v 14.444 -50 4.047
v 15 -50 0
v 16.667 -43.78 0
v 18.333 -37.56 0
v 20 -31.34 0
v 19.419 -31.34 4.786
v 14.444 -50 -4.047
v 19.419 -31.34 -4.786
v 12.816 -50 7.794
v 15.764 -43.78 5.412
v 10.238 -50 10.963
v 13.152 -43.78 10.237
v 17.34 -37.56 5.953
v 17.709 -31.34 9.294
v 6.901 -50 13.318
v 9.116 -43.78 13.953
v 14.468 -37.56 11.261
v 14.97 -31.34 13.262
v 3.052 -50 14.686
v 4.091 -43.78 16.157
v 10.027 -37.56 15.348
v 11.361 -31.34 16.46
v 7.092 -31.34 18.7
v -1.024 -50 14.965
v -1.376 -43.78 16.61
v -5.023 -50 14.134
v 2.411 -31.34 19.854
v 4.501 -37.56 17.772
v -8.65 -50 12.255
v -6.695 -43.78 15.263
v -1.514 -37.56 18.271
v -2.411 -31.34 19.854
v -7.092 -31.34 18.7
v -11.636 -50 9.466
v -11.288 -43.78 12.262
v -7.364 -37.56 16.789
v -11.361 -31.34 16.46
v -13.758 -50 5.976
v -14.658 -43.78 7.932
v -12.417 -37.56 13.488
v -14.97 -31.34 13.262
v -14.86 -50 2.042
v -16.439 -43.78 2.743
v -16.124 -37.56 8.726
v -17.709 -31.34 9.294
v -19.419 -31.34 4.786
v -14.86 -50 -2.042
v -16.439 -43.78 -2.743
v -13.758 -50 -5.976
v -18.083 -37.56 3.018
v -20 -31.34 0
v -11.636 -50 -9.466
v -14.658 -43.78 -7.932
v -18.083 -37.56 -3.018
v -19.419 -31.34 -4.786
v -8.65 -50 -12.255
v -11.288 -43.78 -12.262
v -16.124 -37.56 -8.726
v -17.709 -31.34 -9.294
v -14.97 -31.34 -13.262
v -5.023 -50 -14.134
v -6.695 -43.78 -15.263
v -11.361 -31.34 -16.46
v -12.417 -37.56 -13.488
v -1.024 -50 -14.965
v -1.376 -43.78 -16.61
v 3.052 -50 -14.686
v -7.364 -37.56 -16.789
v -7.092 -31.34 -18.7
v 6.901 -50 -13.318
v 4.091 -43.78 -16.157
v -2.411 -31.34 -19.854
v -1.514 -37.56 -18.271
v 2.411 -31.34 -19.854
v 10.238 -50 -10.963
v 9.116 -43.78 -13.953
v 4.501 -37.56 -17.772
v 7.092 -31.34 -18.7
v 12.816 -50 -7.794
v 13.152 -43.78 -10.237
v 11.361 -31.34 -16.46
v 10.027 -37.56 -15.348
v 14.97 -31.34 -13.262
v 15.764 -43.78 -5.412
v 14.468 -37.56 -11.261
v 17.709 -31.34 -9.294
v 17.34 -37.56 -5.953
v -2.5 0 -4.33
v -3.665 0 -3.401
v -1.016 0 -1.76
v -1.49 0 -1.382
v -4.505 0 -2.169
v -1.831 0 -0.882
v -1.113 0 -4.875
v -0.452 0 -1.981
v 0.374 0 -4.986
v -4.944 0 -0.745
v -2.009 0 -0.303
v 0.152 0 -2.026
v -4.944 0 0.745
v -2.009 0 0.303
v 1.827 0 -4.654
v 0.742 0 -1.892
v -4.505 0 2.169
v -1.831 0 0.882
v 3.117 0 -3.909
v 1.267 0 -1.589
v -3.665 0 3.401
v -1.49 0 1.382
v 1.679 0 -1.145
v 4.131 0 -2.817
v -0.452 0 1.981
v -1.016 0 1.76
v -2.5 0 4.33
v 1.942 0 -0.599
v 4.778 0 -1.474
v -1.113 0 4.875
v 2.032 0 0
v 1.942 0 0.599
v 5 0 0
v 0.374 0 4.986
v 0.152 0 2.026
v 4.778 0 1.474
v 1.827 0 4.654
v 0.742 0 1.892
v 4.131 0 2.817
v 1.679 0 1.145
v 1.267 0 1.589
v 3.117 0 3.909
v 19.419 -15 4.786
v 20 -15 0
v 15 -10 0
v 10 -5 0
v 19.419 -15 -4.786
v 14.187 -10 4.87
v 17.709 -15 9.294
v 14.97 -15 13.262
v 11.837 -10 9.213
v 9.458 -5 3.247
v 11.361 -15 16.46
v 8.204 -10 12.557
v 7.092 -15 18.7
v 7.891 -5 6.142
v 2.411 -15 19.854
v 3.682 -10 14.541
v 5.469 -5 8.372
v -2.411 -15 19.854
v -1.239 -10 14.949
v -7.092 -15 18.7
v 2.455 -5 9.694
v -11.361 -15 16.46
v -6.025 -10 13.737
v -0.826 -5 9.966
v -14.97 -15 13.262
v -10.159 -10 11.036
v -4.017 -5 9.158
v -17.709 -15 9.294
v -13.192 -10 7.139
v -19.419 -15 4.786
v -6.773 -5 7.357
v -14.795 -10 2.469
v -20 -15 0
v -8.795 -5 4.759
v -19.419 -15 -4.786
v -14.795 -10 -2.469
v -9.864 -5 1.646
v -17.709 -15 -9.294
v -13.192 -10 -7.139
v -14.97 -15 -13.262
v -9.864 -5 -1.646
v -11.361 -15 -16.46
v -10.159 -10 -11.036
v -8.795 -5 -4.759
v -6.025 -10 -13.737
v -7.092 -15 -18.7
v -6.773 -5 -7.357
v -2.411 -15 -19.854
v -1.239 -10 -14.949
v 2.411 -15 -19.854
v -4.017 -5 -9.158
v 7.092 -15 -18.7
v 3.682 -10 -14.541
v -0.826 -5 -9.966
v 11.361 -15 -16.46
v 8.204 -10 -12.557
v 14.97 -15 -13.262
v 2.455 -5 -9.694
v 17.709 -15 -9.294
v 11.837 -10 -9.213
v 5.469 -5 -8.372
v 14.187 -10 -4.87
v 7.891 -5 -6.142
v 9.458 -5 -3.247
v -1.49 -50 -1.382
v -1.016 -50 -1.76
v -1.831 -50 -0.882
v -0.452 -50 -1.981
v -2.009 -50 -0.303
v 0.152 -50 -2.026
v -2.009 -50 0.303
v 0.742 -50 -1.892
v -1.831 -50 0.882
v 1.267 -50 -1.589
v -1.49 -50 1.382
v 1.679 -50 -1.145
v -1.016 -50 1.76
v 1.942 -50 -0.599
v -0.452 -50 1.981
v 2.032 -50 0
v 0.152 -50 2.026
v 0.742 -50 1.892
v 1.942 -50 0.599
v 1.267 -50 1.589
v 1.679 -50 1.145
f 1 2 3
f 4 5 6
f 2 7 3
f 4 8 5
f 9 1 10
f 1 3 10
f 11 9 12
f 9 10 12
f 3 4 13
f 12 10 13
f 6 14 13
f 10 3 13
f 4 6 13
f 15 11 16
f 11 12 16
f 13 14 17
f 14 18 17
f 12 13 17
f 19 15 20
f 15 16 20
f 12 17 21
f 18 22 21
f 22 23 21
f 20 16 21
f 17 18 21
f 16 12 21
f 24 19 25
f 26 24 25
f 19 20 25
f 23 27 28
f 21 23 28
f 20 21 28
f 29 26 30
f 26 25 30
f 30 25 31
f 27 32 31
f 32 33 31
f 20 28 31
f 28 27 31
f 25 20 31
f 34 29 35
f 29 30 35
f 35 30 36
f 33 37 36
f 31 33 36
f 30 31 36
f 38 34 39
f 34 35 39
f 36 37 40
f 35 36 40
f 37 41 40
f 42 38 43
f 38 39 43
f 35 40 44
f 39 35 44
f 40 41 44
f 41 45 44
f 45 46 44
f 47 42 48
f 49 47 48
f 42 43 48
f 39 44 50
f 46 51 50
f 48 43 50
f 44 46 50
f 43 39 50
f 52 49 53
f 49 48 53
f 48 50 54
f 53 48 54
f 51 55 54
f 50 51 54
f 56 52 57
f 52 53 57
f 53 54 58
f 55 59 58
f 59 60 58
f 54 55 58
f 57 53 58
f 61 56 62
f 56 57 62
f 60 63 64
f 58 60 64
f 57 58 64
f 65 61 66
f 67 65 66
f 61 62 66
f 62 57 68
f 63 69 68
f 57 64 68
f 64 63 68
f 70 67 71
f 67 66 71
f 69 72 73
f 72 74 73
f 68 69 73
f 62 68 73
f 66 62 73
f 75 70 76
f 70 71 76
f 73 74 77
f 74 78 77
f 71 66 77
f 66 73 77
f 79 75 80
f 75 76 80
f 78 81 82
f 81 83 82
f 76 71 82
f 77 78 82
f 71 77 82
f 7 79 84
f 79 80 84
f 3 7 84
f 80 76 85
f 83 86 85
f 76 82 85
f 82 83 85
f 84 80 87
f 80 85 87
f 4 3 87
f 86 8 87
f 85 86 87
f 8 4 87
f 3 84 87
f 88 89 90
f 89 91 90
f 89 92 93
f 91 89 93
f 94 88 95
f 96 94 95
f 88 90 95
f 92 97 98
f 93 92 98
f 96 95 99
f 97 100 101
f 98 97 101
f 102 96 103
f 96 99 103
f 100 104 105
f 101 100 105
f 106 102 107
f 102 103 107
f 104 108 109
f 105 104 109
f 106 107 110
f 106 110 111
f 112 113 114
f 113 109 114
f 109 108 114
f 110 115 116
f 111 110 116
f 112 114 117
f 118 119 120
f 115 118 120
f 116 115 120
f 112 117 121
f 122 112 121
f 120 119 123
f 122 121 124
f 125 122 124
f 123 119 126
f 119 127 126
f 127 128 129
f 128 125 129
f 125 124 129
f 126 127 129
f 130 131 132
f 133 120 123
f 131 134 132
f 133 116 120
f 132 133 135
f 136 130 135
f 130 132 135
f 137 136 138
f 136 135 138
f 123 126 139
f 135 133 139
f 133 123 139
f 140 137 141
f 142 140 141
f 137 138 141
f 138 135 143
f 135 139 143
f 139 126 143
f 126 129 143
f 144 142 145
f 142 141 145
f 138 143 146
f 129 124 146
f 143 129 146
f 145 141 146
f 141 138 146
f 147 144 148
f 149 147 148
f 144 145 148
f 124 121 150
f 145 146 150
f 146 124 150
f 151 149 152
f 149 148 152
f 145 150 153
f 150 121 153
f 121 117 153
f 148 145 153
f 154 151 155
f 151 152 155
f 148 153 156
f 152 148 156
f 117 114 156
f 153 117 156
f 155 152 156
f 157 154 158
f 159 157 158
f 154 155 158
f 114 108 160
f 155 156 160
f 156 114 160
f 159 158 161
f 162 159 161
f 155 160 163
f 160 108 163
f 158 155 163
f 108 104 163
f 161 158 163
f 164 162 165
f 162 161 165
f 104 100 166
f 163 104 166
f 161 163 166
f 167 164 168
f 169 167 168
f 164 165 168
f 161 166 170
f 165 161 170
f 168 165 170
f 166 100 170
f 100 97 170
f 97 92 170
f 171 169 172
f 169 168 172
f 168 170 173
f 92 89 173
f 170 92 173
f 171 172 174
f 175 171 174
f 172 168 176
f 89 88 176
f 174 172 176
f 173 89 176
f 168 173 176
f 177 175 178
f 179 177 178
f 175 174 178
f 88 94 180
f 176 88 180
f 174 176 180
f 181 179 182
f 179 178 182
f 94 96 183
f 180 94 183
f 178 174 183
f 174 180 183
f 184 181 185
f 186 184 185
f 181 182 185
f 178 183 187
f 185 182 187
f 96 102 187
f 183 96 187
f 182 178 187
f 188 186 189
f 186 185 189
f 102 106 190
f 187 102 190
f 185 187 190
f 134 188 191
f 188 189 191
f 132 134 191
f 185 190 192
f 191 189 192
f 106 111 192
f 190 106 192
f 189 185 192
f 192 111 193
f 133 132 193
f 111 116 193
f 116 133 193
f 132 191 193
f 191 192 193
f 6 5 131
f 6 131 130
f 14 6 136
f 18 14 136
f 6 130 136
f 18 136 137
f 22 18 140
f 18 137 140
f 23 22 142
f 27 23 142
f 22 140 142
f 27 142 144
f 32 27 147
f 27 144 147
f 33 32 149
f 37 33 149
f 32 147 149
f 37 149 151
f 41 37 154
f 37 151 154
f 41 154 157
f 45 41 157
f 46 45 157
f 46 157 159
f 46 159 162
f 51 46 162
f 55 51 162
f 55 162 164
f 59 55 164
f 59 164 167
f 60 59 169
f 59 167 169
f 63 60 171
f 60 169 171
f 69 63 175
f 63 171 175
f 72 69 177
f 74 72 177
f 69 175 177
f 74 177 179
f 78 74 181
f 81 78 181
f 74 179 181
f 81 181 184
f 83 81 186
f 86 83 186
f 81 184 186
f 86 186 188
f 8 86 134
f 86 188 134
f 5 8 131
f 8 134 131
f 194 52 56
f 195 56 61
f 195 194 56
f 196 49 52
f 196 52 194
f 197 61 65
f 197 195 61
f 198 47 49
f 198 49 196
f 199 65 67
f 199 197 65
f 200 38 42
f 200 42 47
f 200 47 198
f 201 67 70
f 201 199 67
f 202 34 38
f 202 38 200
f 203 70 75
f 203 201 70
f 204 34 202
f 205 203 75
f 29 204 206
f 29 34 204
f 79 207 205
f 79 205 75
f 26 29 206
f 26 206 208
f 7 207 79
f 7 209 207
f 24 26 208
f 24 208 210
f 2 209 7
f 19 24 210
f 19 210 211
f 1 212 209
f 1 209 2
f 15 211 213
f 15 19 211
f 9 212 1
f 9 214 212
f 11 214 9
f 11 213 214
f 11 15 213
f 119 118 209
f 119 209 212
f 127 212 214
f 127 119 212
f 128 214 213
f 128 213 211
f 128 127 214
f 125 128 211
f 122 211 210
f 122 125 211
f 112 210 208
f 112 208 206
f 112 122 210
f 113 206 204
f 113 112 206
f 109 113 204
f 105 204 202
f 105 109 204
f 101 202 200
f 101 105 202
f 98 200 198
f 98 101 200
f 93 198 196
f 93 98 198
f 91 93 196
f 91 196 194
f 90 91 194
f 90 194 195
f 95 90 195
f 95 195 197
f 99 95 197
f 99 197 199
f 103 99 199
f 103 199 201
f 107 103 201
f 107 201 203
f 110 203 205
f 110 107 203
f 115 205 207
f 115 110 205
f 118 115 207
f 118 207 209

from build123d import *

# Parameters (mm, degrees)
F0_R     = 20
F0_R_2   = 2.032
F1_DEPTH = 50
F2_SIZE2 = 18.6602540378
F2_SIZE  = 5
F3_SIZE  = 15


with BuildPart() as f1:
    # F0 (on Front) → F1 (new body)
    with BuildSketch(Plane.XZ):
        Circle(F0_R)
        Circle(F0_R_2, mode=Mode.SUBTRACT)
    extrude(amount=F1_DEPTH)

    # F2
    f2_edges = [f1.edges().sort_by_distance(p)[0] for p in [
        (-20, -50, 0),
    ]]
    f2_side = f1.faces().sort_by_distance((-19.434315, -50, 0))[0]
    chamfer(f2_edges, length=F2_SIZE, length2=F2_SIZE2, reference=f2_side)

    # F3
    f3_edges = [f1.edges().sort_by_distance(p)[0] for p in [
        (-20, 0, 0),
    ]]
    chamfer(f3_edges, length=F3_SIZE)


solid = f1.part
